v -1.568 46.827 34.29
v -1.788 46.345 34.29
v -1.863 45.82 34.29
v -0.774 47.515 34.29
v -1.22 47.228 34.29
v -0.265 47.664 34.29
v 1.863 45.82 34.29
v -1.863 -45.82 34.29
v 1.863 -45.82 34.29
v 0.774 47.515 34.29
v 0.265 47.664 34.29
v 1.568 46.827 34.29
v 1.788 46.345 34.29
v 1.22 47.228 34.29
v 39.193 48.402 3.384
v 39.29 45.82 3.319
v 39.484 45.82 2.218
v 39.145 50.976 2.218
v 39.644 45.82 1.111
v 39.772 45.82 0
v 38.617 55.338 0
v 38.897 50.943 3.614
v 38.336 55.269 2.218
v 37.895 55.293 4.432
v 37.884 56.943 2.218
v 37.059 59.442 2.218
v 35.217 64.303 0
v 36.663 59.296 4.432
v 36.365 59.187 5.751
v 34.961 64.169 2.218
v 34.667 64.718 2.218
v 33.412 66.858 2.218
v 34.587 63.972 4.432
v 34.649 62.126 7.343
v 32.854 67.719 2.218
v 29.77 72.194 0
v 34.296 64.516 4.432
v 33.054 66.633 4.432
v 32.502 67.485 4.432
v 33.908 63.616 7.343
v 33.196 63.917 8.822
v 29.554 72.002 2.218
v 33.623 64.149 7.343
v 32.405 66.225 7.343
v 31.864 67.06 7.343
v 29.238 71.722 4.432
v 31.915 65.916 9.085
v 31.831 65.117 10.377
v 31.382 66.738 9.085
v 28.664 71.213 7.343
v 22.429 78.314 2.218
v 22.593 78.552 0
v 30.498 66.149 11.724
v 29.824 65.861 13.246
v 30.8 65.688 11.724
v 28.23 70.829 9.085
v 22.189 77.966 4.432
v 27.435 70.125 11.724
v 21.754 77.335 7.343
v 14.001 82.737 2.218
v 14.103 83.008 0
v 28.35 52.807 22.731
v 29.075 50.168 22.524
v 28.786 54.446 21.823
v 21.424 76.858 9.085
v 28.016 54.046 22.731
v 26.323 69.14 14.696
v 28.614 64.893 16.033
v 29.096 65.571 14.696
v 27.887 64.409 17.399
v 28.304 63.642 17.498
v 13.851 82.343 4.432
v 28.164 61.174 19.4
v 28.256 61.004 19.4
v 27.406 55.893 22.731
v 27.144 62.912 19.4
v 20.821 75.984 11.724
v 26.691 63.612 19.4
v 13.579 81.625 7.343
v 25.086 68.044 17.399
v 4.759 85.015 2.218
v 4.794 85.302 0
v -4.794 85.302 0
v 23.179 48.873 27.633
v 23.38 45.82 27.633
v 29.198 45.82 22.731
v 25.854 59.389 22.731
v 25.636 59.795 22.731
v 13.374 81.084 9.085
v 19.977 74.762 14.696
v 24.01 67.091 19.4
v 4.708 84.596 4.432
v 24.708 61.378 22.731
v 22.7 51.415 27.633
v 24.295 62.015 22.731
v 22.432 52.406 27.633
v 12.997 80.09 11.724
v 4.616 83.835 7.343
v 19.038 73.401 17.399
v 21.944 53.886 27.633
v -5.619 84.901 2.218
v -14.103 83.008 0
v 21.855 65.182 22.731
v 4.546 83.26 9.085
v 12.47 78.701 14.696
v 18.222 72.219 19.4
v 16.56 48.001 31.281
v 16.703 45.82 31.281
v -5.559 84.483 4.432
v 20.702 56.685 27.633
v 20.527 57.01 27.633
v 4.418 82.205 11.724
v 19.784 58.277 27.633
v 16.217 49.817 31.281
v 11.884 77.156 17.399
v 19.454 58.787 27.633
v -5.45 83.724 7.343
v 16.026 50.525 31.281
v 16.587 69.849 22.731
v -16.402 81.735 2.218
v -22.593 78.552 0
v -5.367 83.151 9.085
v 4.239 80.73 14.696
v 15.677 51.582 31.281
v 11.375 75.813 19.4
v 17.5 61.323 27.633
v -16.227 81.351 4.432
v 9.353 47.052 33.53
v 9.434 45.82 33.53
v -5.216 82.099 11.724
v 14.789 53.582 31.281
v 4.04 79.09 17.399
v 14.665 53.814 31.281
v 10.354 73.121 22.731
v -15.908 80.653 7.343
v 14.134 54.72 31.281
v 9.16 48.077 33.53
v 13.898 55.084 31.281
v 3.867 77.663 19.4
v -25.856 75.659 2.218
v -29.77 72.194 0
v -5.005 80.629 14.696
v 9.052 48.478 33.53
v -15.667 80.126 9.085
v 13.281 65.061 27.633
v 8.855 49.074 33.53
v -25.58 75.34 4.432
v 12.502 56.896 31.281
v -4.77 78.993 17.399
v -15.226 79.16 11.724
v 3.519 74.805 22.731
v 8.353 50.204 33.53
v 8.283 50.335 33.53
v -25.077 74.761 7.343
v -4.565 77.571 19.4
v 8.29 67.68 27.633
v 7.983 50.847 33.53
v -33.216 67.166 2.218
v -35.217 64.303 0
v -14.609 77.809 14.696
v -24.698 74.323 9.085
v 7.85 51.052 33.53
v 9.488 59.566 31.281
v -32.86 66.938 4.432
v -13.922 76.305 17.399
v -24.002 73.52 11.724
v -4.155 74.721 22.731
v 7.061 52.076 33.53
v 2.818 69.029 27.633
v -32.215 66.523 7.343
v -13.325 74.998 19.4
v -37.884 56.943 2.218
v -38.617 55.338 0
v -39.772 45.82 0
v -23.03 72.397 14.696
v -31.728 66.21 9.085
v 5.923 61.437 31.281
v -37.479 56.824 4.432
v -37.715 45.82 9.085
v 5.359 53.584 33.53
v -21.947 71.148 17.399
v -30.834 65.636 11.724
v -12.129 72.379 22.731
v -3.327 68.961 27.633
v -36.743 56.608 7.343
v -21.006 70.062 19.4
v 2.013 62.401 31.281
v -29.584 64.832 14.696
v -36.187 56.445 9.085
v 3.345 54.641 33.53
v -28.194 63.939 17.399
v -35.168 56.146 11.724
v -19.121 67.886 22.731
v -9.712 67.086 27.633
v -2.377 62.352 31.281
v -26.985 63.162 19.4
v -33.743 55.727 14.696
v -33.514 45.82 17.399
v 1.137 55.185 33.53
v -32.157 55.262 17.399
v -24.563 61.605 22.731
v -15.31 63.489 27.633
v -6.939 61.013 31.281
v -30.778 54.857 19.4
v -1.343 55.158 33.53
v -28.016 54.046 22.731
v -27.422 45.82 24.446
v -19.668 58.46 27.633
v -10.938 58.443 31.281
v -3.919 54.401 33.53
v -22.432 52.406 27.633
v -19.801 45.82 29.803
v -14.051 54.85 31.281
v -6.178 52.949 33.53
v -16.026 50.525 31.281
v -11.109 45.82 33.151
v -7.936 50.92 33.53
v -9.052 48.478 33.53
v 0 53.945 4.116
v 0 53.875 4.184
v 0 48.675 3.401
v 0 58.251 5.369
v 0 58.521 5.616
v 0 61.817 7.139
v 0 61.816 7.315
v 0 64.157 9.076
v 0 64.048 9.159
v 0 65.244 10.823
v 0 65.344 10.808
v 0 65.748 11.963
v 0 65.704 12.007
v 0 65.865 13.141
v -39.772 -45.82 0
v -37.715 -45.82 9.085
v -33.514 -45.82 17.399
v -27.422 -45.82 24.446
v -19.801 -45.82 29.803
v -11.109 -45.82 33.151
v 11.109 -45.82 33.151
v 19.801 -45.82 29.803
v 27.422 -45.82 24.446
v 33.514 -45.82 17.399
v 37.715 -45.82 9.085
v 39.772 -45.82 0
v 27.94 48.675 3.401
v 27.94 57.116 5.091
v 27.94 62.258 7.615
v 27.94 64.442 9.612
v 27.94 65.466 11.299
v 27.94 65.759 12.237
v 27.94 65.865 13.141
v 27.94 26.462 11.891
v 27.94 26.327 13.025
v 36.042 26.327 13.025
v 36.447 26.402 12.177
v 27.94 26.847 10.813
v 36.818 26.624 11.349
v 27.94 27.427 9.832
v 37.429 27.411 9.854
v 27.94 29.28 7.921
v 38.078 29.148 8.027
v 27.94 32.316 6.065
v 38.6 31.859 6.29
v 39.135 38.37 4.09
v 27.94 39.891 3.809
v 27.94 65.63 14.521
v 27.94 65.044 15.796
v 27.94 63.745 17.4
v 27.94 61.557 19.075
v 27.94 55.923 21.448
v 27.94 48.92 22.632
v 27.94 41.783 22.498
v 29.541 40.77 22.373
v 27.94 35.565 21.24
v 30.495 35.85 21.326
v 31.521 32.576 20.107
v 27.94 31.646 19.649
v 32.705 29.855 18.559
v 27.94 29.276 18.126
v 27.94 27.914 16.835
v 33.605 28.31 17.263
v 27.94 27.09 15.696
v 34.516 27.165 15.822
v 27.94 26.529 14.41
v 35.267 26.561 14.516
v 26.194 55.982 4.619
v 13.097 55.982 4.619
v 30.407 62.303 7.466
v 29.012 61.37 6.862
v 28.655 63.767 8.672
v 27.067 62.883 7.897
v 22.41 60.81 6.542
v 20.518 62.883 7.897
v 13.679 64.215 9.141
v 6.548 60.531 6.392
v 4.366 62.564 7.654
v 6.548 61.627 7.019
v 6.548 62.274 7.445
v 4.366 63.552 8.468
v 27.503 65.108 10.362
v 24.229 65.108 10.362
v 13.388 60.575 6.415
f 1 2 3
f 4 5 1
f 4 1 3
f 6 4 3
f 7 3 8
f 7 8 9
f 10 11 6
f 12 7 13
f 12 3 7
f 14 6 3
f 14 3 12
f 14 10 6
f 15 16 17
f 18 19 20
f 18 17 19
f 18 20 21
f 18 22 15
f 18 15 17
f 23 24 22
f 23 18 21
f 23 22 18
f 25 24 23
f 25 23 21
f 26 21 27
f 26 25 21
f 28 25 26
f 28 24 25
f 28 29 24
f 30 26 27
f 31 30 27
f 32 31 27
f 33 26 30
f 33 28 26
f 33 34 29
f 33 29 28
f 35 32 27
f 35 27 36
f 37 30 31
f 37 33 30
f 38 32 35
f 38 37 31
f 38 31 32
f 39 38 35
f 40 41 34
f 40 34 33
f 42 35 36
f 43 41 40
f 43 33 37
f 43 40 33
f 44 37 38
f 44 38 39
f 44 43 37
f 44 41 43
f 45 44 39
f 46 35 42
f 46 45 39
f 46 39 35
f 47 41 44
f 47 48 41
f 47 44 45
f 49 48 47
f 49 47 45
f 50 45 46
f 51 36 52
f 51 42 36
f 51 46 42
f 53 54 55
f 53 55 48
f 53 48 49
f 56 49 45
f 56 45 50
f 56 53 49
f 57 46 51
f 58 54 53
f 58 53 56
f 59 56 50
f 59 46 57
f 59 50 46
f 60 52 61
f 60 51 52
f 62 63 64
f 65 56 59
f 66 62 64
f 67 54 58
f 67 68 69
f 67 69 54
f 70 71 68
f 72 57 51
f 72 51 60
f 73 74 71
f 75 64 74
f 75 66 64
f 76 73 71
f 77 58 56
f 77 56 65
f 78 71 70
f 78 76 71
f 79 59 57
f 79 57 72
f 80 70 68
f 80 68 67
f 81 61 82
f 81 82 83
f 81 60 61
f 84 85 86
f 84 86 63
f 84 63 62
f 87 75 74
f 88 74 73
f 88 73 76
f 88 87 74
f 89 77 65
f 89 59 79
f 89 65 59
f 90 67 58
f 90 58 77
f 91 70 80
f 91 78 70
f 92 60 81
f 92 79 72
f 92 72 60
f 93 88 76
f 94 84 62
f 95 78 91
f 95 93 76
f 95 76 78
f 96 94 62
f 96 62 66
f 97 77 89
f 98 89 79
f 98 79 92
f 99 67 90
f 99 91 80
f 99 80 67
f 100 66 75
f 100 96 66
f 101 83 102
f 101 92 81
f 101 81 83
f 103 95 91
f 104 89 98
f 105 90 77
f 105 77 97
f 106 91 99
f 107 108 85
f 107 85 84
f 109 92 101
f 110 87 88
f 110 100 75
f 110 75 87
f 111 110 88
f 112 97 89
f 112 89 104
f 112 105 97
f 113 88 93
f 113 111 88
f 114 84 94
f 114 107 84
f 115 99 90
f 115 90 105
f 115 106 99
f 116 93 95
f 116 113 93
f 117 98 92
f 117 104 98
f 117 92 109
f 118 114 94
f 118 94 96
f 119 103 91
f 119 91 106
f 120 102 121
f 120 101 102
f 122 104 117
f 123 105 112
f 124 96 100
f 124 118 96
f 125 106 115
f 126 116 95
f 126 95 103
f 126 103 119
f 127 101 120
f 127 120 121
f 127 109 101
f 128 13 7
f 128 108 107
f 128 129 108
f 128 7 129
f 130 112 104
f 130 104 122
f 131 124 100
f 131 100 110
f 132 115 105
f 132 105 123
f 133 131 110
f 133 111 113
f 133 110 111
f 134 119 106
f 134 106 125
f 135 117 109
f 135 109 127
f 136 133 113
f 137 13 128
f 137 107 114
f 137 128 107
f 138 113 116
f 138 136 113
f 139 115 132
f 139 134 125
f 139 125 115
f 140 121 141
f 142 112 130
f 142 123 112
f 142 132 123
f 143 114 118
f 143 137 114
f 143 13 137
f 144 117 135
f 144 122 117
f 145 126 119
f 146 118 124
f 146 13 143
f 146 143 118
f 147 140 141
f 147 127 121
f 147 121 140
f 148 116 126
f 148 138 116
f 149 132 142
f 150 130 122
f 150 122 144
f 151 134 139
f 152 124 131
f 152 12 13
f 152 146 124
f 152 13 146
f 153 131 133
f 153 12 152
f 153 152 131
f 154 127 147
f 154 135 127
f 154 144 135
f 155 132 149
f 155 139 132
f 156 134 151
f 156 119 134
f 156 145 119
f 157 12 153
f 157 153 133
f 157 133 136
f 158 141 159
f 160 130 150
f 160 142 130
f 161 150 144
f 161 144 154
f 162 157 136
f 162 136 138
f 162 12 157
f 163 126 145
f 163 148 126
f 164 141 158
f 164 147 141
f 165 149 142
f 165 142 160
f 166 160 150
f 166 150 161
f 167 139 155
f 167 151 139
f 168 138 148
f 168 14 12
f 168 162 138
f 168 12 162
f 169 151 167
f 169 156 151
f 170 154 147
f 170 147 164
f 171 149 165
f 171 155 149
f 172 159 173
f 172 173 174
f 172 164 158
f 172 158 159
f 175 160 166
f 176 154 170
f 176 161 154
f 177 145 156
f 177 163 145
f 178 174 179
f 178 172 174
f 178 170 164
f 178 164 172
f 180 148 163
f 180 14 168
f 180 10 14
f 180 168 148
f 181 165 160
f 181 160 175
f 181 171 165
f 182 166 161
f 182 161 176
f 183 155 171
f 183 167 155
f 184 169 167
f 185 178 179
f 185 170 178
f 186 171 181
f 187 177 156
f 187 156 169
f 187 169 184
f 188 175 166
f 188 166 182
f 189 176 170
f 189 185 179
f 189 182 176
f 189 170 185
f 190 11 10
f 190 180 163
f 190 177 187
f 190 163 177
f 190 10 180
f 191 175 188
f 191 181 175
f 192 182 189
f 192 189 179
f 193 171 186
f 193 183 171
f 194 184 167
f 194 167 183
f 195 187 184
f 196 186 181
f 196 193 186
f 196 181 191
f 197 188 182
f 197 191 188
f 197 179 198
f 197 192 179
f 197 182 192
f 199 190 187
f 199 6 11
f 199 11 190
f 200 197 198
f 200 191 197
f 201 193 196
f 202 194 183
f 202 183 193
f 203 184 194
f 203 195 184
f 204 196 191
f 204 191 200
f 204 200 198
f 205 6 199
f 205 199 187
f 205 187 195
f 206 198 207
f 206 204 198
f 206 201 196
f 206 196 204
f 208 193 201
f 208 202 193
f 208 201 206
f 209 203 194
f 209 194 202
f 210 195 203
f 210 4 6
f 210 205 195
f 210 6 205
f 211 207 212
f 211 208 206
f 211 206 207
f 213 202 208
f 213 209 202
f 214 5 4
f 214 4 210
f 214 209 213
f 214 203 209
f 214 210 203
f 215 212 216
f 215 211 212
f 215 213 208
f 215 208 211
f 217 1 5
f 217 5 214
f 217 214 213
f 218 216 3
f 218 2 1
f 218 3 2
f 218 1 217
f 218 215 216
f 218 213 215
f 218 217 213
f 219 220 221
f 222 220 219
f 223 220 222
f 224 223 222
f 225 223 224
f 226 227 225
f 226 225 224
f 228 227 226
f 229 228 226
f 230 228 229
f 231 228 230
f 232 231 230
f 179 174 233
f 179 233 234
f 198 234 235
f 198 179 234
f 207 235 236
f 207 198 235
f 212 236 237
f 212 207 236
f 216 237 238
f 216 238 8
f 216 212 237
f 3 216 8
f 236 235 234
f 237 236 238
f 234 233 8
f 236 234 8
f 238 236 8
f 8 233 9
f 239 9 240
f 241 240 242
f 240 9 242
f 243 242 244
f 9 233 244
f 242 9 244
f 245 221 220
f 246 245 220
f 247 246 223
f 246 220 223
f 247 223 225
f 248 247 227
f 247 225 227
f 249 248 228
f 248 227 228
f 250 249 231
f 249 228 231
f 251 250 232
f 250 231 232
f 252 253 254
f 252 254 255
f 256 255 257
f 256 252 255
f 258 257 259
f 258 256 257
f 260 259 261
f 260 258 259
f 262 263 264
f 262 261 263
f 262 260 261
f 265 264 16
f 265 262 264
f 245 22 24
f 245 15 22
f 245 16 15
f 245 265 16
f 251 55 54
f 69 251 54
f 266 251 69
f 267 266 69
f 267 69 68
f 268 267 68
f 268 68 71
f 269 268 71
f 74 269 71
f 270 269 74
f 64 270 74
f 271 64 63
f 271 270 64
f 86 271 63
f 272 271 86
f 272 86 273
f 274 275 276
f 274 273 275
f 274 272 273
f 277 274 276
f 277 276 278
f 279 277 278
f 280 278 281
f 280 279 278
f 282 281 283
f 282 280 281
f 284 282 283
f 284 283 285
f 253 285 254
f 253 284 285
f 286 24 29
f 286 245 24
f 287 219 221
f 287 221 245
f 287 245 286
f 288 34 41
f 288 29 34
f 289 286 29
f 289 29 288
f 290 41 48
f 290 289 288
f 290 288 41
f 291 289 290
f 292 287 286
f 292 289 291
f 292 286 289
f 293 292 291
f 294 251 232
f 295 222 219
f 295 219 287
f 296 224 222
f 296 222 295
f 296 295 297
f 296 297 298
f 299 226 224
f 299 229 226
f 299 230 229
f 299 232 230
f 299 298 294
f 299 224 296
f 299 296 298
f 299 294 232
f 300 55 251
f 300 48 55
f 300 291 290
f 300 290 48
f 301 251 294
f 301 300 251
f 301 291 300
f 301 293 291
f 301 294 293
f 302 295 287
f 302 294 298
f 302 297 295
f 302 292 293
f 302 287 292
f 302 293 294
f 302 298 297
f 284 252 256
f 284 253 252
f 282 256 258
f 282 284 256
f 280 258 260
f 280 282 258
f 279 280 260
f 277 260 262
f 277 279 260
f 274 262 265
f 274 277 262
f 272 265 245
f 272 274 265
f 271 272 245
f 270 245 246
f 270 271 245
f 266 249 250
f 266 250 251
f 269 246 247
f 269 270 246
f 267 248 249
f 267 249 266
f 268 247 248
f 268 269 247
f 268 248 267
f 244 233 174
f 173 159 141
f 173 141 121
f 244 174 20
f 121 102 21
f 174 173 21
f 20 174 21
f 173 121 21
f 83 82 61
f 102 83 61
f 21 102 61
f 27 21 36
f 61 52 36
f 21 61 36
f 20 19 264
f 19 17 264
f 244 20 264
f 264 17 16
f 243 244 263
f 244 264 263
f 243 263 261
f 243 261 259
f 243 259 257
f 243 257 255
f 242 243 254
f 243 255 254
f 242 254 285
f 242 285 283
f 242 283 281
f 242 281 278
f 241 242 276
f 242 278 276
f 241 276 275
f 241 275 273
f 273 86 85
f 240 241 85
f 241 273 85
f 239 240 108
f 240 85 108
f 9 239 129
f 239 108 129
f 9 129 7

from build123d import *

# Parameters (mm, degrees)
F1_DEPTH    = 34.29
F2_T1_DEPTH = 186.4119082094
F2_T4_ANGLE = 180
F4_DEPTH    = 50.8
F6_DEPTH    = 27.94


# Not quite as in the source:
# - a fillet or chamfer that OpenCascade refuses, or shapes differently, is made with other operations: its cross-section is extruded or revolved along the edge and cut away or added


with BuildPart() as f1:
    # F0 (on Top) → F1 (new body)
    with BuildSketch(Plane.XY):
        with BuildLine():
            ThreePointArc((-39.772413671, 45.8196774125), (0, 6.0472637415), (39.772413671, 45.8196774125))
            Line((39.772413671, 45.8196774125), (-39.772413671, 45.8196774125))
        make_face()
        with BuildLine():
            Line((-39.772413671, 45.8196774125), (39.772413671, 45.8196774125))
            ThreePointArc((39.772413671, 45.8196774125), (0, 85.5920910835), (-39.772413671, 45.8196774125))
        make_face()
        with BuildLine():
            Line((39.772413671, -45.8196774125), (39.772413671, 45.8196774125))
            ThreePointArc((39.772413671, 45.8196774125), (0, 6.0472637415), (-39.772413671, 45.8196774125))
            Line((-39.772413671, 45.8196774125), (-39.772413671, -45.8196774125))
            Line((-39.772413671, -45.8196774125), (39.772413671, -45.8196774125))
        make_face()
    extrude(amount=F1_DEPTH)

    # F2: fillet of radius 38.1 on 3 edges, made by hand

    # F2_s2 → F2_t1 (cut)
    with BuildSketch(Plane.XZ.offset(-45.8196774125)):
        with BuildLine():
            ThreePointArc((-39.772413671, 0), (-27.4216493001, 24.4457162358), (-1.8633923173, 34.29))
            Line((-1.8633923173, 34.29), (-39.772413671, 34.29))
            Line((-39.772413671, 34.29), (-39.772413671, 0))
        make_face()
        with BuildLine():
            ThreePointArc((39.772413671, 0), (27.4216493001, 24.4457162358), (1.8633923173, 34.29))
            Line((1.8633923173, 34.29), (39.772413671, 34.29))
            Line((39.772413671, 34.29), (39.772413671, 0))
        make_face()
    extrude(amount=F2_T1_DEPTH, mode=Mode.SUBTRACT)

    # F2_s3 → F2_t4 (revolve, cut)
    with BuildSketch(Plane.XZ.offset(-45.8196774125)):
        with BuildLine():
            ThreePointArc((39.772413671, 0), (27.4216493001, 24.4457162358), (1.8633923173, 34.29))
            Line((1.8633923173, 34.29), (39.772413671, 34.29))
            Line((39.772413671, 34.29), (39.772413671, 0))
        make_face()
    revolve(axis=Axis((0, 45.8196774125, 34.29), (0, 0, 1)), revolution_arc=F2_T4_ANGLE, mode=Mode.SUBTRACT)

    # F3 (on Right) → F4 (cut)
    with BuildSketch(Plane.YZ):
        with BuildLine():
            add(Edge.make_bspline(
                [(26.3266563416, 13.0248842761), (26.3266563416, -3.7878693164), (55.981522426, 4.6185074799), (85.6363885105, 13.0248842761), (55.981522426, 21.4312610723), (26.3266563416, 29.8376378686), (26.3266563416, 13.0248842761)],
                knots=[0, 0, 0, 2.0943951024, 2.0943951024, 4.1887902048, 4.1887902048, 6.2831853072, 6.2831853072, 6.2831853072], degree=2, weights=[1, 0.5, 1, 0.5, 1, 0.5, 1]))
        make_face()
    extrude(amount=F4_DEPTH, mode=Mode.SUBTRACT)

    # F5 (on Right) → F6 (join)
    with BuildSketch(Plane.YZ):
        with BuildLine():
            add(Edge.make_bspline(
                [(65.8664852381, 13.2574718446), (65.8664852381, 30.580146327), (34.8160881549, 21.9188090858), (3.7656910717, 13.2574718446), (34.8160881549, 4.5961346033), (65.8664852381, -4.0652026379), (65.8664852381, 13.2574718446)],
                knots=[0, 0, 0, 2.0943951024, 2.0943951024, 4.1887902048, 4.1887902048, 6.2831853072, 6.2831853072, 6.2831853072], degree=2, weights=[1, 0.5, 1, 0.5, 1, 0.5, 1]))
        make_face()
    extrude(amount=F6_DEPTH)


solid = f1.part
